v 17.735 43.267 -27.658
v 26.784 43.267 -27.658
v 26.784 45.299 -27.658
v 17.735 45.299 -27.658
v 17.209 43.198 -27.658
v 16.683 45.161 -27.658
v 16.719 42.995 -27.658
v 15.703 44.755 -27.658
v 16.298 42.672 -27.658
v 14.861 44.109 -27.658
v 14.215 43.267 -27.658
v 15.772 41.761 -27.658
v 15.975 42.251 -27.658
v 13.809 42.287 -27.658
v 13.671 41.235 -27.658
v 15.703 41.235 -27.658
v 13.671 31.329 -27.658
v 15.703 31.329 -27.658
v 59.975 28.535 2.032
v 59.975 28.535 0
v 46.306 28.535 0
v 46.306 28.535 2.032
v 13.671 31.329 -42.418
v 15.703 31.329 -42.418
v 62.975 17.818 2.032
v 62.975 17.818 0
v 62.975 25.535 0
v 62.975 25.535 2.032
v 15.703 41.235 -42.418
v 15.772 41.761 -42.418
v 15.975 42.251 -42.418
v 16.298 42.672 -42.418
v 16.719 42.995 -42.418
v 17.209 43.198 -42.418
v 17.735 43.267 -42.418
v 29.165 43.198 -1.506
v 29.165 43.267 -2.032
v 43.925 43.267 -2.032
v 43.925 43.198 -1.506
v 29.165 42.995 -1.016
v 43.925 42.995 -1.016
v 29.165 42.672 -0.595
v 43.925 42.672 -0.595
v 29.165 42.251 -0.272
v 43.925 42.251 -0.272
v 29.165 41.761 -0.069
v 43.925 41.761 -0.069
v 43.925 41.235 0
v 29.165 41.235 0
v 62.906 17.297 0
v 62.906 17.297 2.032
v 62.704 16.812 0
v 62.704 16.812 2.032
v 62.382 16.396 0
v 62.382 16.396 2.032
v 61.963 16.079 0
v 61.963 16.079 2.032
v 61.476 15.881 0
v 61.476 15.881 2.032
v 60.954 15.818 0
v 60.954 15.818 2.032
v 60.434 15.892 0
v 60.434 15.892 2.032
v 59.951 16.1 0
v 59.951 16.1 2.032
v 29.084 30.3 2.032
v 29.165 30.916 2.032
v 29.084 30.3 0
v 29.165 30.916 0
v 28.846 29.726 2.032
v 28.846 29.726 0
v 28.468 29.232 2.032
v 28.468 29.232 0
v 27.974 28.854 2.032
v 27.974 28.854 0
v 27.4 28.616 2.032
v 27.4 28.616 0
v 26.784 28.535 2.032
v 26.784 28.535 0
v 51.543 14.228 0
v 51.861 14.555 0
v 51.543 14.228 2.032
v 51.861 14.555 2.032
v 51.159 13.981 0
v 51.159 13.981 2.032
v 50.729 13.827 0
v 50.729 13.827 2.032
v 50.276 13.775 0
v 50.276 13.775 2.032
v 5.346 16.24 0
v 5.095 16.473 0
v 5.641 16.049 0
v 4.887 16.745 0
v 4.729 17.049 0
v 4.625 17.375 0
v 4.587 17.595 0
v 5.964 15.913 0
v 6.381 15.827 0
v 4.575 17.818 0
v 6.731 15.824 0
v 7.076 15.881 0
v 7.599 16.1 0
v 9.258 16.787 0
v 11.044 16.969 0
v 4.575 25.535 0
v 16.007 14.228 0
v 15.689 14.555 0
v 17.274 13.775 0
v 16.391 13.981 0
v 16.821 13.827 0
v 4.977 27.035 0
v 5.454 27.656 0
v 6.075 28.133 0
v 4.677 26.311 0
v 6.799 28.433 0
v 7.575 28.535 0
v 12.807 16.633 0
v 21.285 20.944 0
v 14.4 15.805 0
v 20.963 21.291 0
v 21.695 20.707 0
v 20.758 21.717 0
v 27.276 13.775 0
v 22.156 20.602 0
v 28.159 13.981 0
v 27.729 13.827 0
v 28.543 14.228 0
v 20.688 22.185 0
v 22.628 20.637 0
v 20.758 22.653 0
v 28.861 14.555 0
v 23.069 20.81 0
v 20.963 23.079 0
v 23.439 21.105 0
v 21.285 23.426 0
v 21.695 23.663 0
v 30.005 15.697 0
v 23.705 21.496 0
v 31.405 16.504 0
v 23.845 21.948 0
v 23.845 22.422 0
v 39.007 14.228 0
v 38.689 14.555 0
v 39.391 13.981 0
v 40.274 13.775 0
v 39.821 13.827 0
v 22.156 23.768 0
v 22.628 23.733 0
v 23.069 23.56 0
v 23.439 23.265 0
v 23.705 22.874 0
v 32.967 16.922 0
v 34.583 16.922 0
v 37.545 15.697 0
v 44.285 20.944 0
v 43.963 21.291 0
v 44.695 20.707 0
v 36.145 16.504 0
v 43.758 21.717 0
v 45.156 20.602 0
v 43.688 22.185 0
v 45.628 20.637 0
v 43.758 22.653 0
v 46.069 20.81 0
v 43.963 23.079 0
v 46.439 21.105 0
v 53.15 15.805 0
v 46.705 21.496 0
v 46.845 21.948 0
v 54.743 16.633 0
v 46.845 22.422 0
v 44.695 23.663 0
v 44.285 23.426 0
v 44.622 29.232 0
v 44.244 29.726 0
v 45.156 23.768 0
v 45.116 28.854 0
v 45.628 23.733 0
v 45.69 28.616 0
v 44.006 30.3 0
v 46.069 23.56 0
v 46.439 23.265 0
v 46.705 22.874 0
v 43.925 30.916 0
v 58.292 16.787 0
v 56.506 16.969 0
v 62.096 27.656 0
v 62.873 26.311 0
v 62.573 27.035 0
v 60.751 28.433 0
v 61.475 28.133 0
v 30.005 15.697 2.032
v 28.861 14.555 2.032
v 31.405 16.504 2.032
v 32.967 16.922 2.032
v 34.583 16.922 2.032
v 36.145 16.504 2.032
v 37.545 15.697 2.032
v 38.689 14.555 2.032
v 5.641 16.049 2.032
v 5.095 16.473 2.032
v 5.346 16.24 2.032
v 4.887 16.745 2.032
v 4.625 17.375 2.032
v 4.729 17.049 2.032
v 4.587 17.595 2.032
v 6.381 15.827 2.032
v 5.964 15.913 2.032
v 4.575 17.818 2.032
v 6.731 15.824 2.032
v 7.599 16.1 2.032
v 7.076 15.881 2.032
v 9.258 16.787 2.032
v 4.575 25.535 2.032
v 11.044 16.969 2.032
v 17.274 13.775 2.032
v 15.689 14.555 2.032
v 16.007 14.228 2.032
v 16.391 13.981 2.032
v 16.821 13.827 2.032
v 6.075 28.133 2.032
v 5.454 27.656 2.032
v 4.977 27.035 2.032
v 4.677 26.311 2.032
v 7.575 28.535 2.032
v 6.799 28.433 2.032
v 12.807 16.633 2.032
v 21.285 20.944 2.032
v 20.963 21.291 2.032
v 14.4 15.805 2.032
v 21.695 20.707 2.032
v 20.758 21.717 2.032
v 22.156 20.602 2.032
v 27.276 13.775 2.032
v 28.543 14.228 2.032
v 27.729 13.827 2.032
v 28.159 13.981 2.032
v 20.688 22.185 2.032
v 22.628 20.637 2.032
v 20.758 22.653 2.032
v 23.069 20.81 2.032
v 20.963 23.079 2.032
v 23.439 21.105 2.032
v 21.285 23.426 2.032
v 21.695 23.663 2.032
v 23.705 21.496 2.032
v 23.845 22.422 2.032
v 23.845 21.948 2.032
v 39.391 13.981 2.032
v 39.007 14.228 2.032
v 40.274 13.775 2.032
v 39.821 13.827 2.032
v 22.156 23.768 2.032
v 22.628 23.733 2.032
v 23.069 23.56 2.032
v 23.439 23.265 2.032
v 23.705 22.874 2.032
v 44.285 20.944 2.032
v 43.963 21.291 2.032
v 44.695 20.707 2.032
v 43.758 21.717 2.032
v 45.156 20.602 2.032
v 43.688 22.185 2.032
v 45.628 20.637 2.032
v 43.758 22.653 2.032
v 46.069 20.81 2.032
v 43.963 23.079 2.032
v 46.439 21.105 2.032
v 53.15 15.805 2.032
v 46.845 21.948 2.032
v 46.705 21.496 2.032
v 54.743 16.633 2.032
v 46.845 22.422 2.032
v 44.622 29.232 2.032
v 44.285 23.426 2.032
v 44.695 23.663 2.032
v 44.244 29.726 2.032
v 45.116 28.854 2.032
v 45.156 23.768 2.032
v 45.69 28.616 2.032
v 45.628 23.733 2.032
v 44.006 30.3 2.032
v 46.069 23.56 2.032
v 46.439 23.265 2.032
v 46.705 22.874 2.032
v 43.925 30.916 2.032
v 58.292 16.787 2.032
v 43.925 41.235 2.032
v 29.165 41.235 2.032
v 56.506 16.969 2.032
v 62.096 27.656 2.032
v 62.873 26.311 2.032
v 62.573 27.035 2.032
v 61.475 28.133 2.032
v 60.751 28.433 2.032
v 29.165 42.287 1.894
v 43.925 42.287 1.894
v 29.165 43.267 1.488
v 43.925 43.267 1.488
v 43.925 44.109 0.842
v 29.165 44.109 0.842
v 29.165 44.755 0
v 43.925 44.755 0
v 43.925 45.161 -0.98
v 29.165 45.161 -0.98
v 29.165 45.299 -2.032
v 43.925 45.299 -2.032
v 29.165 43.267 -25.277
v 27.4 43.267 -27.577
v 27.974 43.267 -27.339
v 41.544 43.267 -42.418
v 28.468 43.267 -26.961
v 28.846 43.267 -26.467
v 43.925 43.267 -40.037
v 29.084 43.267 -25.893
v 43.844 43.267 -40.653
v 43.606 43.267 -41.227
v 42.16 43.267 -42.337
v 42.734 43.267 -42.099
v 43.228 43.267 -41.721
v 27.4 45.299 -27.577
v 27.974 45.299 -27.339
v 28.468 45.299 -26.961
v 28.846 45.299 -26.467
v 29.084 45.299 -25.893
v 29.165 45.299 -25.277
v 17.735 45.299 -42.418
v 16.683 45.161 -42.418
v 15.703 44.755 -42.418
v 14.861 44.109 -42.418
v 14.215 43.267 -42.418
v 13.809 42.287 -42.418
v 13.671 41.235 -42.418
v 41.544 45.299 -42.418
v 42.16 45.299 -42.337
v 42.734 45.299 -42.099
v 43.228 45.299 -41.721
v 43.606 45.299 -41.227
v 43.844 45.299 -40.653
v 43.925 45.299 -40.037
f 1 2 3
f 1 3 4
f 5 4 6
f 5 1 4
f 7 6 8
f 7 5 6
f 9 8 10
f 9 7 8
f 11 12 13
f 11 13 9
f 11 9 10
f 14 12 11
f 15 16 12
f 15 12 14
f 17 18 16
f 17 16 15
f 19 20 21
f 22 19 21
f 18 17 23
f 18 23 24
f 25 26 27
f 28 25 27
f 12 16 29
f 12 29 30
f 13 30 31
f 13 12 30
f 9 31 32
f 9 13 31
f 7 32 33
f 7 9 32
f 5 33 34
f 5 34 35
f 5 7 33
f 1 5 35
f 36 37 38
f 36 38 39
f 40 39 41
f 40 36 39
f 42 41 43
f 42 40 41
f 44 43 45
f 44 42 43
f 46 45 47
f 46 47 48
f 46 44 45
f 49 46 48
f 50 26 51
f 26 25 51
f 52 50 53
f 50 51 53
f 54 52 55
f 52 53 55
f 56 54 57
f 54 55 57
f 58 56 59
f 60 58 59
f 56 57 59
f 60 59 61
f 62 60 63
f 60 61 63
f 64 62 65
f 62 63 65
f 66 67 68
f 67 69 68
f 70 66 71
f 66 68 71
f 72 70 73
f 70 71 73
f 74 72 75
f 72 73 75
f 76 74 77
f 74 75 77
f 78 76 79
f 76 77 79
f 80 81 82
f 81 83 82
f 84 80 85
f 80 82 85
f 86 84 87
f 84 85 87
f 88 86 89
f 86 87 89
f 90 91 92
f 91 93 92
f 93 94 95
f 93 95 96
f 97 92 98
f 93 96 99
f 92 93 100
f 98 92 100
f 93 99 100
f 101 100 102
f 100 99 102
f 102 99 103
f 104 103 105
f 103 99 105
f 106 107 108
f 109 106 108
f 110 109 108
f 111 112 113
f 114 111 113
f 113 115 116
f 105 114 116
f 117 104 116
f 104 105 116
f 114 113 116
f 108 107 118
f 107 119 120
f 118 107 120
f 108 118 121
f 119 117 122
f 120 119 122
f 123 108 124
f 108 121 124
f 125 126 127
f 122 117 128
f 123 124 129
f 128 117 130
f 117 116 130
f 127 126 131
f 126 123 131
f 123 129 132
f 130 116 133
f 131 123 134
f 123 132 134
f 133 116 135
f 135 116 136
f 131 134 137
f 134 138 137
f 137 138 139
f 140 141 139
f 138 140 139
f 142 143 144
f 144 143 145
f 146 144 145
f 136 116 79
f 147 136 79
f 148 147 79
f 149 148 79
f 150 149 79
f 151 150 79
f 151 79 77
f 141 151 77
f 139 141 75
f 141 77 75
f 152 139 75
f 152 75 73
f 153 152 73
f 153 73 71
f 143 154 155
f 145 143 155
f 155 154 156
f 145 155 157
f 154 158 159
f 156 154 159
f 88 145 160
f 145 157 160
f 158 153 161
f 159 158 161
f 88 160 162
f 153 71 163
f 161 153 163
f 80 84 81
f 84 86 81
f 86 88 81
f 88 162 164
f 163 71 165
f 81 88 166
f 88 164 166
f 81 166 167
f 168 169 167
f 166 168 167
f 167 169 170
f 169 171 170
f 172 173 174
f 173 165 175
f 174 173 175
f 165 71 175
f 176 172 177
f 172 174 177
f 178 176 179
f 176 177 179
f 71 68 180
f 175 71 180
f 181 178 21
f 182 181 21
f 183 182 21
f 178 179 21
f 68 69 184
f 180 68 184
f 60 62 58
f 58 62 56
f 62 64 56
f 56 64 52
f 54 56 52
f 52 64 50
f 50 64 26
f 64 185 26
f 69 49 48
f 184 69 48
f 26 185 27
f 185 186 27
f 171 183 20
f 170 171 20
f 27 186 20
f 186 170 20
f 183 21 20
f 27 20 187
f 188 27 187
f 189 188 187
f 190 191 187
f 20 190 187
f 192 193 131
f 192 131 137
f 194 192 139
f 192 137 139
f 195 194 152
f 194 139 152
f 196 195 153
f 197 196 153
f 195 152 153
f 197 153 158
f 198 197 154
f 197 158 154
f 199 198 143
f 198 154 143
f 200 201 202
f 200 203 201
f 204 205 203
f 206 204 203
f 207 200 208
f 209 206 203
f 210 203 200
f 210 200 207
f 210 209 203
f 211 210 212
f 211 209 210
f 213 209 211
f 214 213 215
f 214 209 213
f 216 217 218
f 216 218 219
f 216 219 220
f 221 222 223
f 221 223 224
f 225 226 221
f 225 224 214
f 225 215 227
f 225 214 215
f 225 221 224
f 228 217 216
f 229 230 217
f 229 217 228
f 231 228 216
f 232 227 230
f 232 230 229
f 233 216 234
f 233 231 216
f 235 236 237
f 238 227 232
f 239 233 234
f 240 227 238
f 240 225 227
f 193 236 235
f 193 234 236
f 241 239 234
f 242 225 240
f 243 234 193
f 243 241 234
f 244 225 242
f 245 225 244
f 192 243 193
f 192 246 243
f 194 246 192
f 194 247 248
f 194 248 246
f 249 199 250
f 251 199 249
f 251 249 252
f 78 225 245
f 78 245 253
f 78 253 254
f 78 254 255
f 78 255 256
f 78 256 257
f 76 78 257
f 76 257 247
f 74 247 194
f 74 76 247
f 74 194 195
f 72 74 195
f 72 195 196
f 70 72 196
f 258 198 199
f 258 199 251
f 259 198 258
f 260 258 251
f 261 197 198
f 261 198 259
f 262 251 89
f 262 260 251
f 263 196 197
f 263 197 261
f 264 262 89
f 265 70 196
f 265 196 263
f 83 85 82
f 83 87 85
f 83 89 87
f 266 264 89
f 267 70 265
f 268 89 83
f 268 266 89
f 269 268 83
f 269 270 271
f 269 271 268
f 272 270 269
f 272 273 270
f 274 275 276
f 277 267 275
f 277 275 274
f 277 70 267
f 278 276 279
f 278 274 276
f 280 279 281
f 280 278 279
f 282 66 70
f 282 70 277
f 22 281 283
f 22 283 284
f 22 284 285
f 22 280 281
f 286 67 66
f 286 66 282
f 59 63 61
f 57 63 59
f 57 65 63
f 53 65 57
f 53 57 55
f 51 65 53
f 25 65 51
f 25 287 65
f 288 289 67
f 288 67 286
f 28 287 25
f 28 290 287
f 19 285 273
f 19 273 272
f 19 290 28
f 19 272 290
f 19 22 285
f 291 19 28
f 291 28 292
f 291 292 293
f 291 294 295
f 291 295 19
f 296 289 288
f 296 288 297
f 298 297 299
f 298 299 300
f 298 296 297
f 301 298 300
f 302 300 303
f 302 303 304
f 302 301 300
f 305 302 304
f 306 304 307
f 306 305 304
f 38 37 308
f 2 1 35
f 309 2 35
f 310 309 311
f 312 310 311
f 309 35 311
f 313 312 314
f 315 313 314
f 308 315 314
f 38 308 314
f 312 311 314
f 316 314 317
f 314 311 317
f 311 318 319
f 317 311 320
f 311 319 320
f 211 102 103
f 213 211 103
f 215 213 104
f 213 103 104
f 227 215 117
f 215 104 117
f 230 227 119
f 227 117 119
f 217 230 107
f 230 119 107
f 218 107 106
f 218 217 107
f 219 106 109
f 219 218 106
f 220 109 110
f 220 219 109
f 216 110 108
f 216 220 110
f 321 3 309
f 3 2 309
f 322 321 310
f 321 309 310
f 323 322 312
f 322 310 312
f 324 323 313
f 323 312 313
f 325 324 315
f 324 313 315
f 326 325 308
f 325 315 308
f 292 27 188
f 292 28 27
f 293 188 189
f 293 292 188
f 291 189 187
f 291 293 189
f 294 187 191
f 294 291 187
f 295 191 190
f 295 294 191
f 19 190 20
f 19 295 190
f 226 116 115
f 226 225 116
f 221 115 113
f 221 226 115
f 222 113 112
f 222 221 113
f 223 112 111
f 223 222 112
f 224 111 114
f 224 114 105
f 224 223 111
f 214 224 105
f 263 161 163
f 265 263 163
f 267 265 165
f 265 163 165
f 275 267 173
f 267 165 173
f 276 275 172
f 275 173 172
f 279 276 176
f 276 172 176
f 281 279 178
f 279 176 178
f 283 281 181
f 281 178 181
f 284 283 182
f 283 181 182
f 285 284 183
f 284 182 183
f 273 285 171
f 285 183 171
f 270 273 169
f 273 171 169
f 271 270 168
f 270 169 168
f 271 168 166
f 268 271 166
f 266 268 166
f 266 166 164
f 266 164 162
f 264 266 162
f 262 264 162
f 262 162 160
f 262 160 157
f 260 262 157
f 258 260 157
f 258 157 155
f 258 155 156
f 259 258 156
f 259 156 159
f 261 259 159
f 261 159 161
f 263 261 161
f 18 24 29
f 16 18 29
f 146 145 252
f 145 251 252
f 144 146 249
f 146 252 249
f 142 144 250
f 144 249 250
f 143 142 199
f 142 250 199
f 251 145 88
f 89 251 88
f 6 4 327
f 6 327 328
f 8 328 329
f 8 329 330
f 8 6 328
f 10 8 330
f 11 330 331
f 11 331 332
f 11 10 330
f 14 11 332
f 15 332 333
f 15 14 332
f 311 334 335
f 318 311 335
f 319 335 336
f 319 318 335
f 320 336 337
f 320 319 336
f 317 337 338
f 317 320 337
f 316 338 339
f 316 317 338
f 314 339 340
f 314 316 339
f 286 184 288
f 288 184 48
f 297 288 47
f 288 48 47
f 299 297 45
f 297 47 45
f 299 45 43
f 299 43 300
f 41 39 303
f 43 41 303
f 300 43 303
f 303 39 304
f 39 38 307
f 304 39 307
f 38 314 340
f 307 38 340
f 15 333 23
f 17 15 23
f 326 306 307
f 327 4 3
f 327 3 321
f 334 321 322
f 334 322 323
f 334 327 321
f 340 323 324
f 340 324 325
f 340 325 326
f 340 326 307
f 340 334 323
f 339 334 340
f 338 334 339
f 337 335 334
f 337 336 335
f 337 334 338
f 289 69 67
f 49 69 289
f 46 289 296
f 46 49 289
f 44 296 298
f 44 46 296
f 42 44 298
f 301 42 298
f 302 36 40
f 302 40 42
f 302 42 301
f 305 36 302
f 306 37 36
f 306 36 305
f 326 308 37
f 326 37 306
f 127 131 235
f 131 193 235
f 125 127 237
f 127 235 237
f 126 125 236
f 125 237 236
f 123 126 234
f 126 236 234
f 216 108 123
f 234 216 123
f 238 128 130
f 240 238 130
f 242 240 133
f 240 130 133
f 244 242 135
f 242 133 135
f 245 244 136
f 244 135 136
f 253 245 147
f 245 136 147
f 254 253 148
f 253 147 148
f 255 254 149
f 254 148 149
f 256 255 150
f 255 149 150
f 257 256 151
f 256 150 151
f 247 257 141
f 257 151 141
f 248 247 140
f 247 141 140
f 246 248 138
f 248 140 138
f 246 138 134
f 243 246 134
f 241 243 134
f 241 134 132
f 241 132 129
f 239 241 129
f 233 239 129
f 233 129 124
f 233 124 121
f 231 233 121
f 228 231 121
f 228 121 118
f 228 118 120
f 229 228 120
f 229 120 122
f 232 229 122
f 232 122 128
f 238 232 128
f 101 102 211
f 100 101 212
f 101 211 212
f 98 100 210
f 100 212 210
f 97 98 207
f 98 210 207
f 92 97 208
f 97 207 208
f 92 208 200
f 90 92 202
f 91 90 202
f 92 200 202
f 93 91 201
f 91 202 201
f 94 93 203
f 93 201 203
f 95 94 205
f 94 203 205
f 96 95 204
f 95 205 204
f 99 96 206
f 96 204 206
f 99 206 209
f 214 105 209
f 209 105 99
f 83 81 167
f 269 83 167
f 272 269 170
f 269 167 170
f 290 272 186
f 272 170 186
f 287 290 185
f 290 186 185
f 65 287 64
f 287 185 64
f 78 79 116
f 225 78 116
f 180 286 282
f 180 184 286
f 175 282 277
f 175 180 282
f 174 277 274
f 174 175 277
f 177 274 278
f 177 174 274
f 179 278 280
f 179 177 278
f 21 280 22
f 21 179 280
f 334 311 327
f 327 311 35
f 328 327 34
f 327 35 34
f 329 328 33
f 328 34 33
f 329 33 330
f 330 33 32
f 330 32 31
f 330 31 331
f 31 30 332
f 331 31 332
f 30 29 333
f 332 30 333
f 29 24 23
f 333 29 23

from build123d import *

# Parameters (mm, degrees)
BOSS_EXTRUDE1_DEPTH = 2.032
FILLET1_R           = 3
FILLET2_R           = 2
SKETCH14_R          = 1.5874999999999986
CUT_EXTRUDE1_DEPTH  = 70.16809880796494
SKETCH15_W          = 14.760000000000002
SKETCH15_H          = 12.699999999999996
BOSS_EXTRUDE4_DEPTH = 2.032
EDGE_FLANGE3_DEPTH  = 14.760000000000002
BOSS_EXTRUDE5_DEPTH = 2.032
EDGE_FLANGE4_DEPTH  = 14.760000000000002
FILLET4_R           = 2.38125


# Sheet-metal steps are written as plain solids
with BuildPart() as part:
    # Sketch3 → Boss-Extrude1 (new body)
    with BuildSketch(Plane.XY):
        with BuildLine():
            ThreePointArc((4.574999999999999, 10.775), (9.225864227432316, 16.77834726283189), (16.200863986500366, 13.774999999999732))
            Line((16.20086398650046, 13.774999999999999), (28.34913601349985, 13.774999999999999))
            ThreePointArc((28.349136013499827, 13.775000000000073), (33.77500000000019, 16.974999999999998), (39.20086398650036, 13.77499999999973))
            Line((39.20086398650045, 13.774999999999999), (51.34913601349986, 13.774999999999999))
            ThreePointArc((51.34913601349983, 13.775000000000077), (58.32413577256787, 16.778347262831836), (62.974999999999994, 10.775000000000002))
            Line((62.974999999999994, 10.775), (62.975, 28.534999999999997))
            Line((62.97500000000001, 28.534999999999997), (4.574999999999999, 28.534999999999997))
            Line((4.574999999999999, 28.534999999999997), (4.574999999999999, 10.774999999999999))
        make_face()
    extrude(amount=BOSS_EXTRUDE1_DEPTH)

    # Fillet1
    fillet1_edges = [part.edges().sort_by_distance(p)[0] for p in [
        (4.574999999999999, 28.534999999999997, 1.016),
        (62.97500000000001, 28.534999999999997, 1.016),
    ]]
    fillet(fillet1_edges, radius=FILLET1_R)

    # Fillet2
    fillet2_edges = [part.edges().sort_by_distance(p)[0] for p in [
        (62.974999999999994, 10.775000000000002, 1.016),
    ]]
    fillet(fillet2_edges, radius=FILLET2_R)
    fillet2_2_edges = [part.edges().sort_by_distance(p)[0] for p in [
        (51.349136013499844, 13.775000000000038, 1.016),
    ]]
    fillet(fillet2_2_edges, radius=FILLET2_R)
    fillet2_3_edges = [part.edges().sort_by_distance(p)[0] for p in [
        (39.20086398650041, 13.774999999999864, 1.016),
    ]]
    fillet(fillet2_3_edges, radius=FILLET2_R)
    fillet2_4_edges = [part.edges().sort_by_distance(p)[0] for p in [
        (28.349136013499837, 13.775000000000036, 1.016),
    ]]
    fillet(fillet2_4_edges, radius=FILLET2_R)
    fillet2_5_edges = [part.edges().sort_by_distance(p)[0] for p in [
        (4.574999999999999, 10.774999999999999, 1.016),
    ]]
    fillet(fillet2_5_edges, radius=FILLET2_R)
    fillet2_6_edges = [part.edges().sort_by_distance(p)[0] for p in [
        (16.200863986500412, 13.774999999999865, 1.016),
    ]]
    fillet(fillet2_6_edges, radius=FILLET2_R)

    # Sketch14 → Cut-Extrude1 (cut, through all)
    with BuildSketch(Plane(origin=(0, 0, 0), x_dir=(-1, 0, 0), z_dir=(0, 0, -1))):
        with Locations((-45.275, 22.184999999999995)):
            Circle(SKETCH14_R)
        with Locations((-22.275000000000002, 22.184999999999995)):
            Circle(SKETCH14_R)
    extrude(amount=-CUT_EXTRUDE1_DEPTH, mode=Mode.SUBTRACT)

    # Sketch15 → Boss-Extrude4 (add)
    with BuildSketch(Plane.XY.offset(2.032)):
        with Locations((36.545, 34.88499999999999)):
            Rectangle(SKETCH15_W, SKETCH15_H)
    extrude(amount=-BOSS_EXTRUDE4_DEPTH)

    # Edge-Flange3 section (across the edge) → Edge-Flange3 (add)
    with BuildSketch(Plane(origin=(29.165000000000003, 43.266999999999996, 1.419e-14), x_dir=(0, -1, -3.49e-15), z_dir=(1, 0, 0))):
        with BuildLine():
            Line((-2.032, 2.032000000000007), (-2.032, 42.418000000000006))
            Line((-2.032, 42.418000000000006), (0, 42.418000000000006))
            Line((0, 42.418000000000006), (0, 2.032000000000007))
            ThreePointArc((0, 2.032000000000007), (0.5951590206289381, 0.5951590206289399), (2.032000000000007, 7.11e-15))
            Line((2.032000000000007, 7.11e-15), (2.0320000000000142, -2.031999999999993))
            ThreePointArc((2.0320000000000142, -2.031999999999993), (-0.8416819587421238, -0.8416819587421274), (-2.032, 2.032000000000007))
        make_face()
    extrude(amount=EDGE_FLANGE3_DEPTH)

    # Sketch19 → Boss-Extrude5 (add)
    with BuildSketch(Plane(origin=(0, 45.298999999999985, 1.5561e-13), x_dir=(1, 0, 0), z_dir=(0, 1, 3.44e-15))):
        Polygon((29.165000000000003, 42.41800000000015), (17.735000000000003, 42.41800000000015), (17.73500000000001, 27.658000000000147), (29.165000000000006, 27.658000000000147), align=None)
    extrude(amount=-BOSS_EXTRUDE5_DEPTH)

    # Edge-Flange4 section (across the edge) → Edge-Flange4 (add)
    with BuildSketch(Plane(origin=(15.703000000000005, 43.2670000000001, -27.657999999999998), x_dir=(1, -3.49e-15, -4.7e-16), z_dir=(-4.7e-16, 3.29e-15, -1))):
        with BuildLine():
            Line((-2.032, 2.032000000000007), (-2.032, 11.93800000000001))
            Line((-2.032, 11.93800000000001), (0, 11.93800000000001))
            Line((0, 11.93800000000001), (0, 2.032000000000007))
            ThreePointArc((0, 2.032000000000007), (0.5951590206289381, 0.5951590206289399), (2.032000000000007, 7.11e-15))
            Line((2.032000000000007, 7.11e-15), (2.0320000000000142, -2.031999999999993))
            ThreePointArc((2.0320000000000142, -2.031999999999993), (-0.8416819587421238, -0.8416819587421274), (-2.032, 2.032000000000007))
        make_face()
    extrude(amount=EDGE_FLANGE4_DEPTH)

    # Fillet4
    fillet4_edges = [part.edges().sort_by_distance(p)[0] for p in [
        (29.165000000000006, 44.28300000000008, -27.657999999999994),
        (29.165000000000003, 28.534999999999997, 1.016),
        (43.925000000000004, 28.534999999999997, 1.016),
        (43.925000000000004, 44.28300000000014, -42.41799999999999),
    ]]
    fillet(fillet4_edges, radius=FILLET4_R)


solid = part.part
